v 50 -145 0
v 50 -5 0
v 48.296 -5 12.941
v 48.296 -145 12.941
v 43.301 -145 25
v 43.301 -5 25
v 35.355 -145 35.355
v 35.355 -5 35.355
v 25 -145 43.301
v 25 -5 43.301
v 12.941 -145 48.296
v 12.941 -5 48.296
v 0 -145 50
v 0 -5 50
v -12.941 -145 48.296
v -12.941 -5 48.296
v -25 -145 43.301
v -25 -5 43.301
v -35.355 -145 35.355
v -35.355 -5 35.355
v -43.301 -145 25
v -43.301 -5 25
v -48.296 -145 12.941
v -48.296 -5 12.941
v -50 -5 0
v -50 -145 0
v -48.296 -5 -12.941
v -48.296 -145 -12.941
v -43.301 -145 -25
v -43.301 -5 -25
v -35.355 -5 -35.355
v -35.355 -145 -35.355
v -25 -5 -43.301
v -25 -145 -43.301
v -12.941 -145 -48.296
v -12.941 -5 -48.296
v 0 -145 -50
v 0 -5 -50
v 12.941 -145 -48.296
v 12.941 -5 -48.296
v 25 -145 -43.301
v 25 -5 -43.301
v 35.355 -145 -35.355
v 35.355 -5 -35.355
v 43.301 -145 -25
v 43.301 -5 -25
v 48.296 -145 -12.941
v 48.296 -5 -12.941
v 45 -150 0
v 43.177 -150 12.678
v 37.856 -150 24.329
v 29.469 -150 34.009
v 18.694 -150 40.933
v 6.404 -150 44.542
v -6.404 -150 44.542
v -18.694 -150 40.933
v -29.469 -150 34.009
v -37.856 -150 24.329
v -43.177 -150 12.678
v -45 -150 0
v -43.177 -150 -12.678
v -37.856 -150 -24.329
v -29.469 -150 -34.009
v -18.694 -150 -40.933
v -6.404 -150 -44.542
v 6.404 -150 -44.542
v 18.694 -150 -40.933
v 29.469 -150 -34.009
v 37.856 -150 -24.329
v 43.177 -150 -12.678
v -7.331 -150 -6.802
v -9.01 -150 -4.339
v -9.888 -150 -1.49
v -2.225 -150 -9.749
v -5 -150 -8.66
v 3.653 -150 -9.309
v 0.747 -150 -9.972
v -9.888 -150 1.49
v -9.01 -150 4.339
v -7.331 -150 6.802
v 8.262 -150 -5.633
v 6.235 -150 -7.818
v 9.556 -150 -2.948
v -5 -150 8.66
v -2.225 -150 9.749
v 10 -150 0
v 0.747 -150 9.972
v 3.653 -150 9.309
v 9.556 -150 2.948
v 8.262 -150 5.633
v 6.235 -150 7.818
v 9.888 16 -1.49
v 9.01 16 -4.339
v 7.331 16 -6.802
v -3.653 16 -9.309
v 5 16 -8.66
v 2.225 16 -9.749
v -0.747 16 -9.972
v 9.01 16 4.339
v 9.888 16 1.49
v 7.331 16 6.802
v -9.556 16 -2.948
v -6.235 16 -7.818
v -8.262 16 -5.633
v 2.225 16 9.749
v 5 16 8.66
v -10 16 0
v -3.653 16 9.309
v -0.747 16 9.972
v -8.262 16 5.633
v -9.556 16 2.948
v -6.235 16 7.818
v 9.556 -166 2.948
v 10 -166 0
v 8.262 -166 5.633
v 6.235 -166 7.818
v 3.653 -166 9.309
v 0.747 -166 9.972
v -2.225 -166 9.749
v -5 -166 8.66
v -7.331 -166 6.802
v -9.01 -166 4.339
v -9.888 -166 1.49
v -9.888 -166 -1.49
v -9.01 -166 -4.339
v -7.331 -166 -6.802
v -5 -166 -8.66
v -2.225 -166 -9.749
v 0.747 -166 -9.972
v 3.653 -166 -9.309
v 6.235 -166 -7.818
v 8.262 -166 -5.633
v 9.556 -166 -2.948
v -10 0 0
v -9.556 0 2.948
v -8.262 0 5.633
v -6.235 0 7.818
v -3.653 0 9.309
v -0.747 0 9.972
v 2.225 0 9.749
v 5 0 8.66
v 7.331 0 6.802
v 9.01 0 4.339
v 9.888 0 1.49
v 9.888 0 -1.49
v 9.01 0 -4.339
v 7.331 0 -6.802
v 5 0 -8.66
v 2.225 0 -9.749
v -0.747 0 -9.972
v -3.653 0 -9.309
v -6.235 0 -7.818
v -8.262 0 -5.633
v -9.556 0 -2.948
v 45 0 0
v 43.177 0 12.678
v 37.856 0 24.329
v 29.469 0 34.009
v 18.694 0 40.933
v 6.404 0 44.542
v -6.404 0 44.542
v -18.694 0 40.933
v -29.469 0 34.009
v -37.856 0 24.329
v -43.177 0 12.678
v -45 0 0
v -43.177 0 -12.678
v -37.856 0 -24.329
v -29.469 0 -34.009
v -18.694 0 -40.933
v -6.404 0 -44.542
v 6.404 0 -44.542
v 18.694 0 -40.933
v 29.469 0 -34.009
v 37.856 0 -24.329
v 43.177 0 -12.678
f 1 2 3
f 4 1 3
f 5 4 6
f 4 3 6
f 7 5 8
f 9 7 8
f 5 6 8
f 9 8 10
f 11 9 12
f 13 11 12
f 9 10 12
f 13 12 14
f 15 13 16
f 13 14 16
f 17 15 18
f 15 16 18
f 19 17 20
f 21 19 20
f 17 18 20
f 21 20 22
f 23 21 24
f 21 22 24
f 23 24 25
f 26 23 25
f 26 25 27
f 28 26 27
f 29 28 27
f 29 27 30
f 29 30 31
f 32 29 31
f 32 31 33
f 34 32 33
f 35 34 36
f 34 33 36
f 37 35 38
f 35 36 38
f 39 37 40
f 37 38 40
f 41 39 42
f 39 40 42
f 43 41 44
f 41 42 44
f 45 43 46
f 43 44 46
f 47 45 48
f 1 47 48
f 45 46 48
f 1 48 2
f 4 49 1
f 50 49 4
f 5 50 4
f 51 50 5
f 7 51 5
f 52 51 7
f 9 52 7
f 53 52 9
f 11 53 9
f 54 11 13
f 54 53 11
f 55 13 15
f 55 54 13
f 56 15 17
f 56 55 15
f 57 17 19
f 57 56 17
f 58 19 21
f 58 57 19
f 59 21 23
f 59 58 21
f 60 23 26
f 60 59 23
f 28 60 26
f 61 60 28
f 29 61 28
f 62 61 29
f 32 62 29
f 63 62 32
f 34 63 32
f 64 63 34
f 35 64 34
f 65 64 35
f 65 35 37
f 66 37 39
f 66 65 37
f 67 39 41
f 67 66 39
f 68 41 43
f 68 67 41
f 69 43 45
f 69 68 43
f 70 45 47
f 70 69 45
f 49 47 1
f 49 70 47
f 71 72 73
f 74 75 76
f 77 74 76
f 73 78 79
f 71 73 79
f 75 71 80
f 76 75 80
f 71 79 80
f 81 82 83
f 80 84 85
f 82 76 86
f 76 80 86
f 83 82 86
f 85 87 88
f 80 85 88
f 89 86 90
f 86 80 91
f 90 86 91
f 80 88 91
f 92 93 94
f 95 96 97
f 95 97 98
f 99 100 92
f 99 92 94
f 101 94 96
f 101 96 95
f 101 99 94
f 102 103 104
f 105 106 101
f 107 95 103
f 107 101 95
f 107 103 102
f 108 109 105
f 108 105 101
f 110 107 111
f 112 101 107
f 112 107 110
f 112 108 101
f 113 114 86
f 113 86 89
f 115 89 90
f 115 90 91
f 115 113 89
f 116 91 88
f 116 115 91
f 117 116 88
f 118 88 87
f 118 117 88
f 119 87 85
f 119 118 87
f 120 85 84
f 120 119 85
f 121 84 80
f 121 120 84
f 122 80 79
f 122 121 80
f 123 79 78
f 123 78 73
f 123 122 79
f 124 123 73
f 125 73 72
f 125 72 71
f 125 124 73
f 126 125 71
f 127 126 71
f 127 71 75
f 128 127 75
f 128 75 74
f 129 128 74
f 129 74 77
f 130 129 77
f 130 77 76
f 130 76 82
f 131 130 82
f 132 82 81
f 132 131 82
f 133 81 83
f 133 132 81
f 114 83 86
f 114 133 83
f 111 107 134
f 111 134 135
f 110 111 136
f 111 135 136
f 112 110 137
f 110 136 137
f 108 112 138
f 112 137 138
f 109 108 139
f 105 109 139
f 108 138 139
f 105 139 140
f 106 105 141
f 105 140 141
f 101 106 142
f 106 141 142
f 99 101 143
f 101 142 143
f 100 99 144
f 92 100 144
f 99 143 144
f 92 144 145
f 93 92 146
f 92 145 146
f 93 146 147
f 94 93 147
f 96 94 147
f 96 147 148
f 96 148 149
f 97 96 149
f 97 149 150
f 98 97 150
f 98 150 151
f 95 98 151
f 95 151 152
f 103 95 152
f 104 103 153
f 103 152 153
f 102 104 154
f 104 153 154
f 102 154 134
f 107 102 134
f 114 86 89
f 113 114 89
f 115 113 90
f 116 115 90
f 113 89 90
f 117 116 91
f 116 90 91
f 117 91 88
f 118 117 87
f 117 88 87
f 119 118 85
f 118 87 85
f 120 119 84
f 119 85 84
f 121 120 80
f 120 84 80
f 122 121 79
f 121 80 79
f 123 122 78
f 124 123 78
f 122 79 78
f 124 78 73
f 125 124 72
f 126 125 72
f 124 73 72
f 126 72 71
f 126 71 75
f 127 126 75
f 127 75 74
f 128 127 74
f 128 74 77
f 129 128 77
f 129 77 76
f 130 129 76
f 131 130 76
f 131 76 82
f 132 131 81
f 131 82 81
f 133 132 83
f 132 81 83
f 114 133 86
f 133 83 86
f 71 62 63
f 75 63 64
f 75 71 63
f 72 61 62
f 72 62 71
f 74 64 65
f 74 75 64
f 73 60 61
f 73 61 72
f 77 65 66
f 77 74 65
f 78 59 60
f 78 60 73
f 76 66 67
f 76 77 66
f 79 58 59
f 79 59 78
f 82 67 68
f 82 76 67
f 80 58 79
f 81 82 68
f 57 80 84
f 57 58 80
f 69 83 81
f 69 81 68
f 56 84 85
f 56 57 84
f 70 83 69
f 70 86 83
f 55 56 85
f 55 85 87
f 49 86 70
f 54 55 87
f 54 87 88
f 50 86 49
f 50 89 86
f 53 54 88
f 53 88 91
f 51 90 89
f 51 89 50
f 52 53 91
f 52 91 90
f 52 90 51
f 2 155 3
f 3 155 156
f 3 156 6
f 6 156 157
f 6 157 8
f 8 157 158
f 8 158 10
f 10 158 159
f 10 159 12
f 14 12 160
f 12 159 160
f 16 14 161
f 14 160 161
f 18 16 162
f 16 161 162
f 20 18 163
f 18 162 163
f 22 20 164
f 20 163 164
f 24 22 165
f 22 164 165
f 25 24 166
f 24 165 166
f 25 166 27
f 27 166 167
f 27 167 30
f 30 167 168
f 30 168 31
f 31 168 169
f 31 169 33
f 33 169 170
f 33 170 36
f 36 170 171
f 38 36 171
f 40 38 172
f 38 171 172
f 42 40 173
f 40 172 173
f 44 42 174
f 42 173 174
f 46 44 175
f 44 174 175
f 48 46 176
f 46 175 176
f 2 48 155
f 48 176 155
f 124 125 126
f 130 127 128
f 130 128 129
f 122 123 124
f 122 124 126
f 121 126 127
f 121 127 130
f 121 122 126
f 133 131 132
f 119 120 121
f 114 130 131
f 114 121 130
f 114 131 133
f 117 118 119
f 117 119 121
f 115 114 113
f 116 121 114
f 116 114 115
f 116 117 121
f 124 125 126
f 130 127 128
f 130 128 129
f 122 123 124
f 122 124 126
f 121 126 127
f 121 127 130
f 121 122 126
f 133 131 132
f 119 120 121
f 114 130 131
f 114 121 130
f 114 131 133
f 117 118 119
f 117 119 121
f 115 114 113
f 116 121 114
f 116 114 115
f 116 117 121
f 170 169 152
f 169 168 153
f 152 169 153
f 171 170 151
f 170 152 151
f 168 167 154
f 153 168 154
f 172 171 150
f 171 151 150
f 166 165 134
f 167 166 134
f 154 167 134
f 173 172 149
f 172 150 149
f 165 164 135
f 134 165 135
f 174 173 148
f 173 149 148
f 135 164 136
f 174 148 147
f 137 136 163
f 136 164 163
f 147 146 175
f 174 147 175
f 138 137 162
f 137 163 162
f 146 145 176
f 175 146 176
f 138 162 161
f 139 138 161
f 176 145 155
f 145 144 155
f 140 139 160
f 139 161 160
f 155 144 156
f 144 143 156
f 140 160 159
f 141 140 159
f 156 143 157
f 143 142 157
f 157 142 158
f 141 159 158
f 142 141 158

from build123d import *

# Parameters (mm, degrees)
F0_R      = 50
F1_DEPTH  = 150
F2_SIZE2  = 5
F2_SIZE   = 5
F3_R      = 10
F4_DEPTH  = 16
F5_R      = 10
F6_DEPTH  = 16
F6_FACE_R = 10
F7_DEPTH  = 16


with BuildPart() as f1:
    # F0 (on Front) → F1 (new body)
    with BuildSketch(Plane.XZ):
        Circle(F0_R)
    extrude(amount=F1_DEPTH)

    # F2
    f2_edges = [f1.edges().sort_by_distance(p)[0] for p in [
        (50, -75, 0),
        (-50, 0, 0),
        (-50, -150, 0),
    ]]
    chamfer(f2_edges, length=F2_SIZE, length2=F2_SIZE2)

    # F3 (on face) → F4 (join)
    with BuildSketch(Plane(origin=(0, 0, 0), x_dir=(-1, 0, 0), z_dir=(0, 1, 0))):
        Circle(F3_R)
    extrude(amount=F4_DEPTH)

    # F5 (on face) → F6 (join)
    with BuildSketch(Plane.XZ.offset(150)):
        Circle(F5_R)
    extrude(amount=F6_DEPTH)


with BuildPart() as f7:
    # F6_face (on face) → F7 (new body)
    with BuildSketch(Plane.XZ.offset(166)):
        Circle(F6_FACE_R)
    extrude(amount=-F7_DEPTH)


solid = Compound([f1.part, f7.part])
